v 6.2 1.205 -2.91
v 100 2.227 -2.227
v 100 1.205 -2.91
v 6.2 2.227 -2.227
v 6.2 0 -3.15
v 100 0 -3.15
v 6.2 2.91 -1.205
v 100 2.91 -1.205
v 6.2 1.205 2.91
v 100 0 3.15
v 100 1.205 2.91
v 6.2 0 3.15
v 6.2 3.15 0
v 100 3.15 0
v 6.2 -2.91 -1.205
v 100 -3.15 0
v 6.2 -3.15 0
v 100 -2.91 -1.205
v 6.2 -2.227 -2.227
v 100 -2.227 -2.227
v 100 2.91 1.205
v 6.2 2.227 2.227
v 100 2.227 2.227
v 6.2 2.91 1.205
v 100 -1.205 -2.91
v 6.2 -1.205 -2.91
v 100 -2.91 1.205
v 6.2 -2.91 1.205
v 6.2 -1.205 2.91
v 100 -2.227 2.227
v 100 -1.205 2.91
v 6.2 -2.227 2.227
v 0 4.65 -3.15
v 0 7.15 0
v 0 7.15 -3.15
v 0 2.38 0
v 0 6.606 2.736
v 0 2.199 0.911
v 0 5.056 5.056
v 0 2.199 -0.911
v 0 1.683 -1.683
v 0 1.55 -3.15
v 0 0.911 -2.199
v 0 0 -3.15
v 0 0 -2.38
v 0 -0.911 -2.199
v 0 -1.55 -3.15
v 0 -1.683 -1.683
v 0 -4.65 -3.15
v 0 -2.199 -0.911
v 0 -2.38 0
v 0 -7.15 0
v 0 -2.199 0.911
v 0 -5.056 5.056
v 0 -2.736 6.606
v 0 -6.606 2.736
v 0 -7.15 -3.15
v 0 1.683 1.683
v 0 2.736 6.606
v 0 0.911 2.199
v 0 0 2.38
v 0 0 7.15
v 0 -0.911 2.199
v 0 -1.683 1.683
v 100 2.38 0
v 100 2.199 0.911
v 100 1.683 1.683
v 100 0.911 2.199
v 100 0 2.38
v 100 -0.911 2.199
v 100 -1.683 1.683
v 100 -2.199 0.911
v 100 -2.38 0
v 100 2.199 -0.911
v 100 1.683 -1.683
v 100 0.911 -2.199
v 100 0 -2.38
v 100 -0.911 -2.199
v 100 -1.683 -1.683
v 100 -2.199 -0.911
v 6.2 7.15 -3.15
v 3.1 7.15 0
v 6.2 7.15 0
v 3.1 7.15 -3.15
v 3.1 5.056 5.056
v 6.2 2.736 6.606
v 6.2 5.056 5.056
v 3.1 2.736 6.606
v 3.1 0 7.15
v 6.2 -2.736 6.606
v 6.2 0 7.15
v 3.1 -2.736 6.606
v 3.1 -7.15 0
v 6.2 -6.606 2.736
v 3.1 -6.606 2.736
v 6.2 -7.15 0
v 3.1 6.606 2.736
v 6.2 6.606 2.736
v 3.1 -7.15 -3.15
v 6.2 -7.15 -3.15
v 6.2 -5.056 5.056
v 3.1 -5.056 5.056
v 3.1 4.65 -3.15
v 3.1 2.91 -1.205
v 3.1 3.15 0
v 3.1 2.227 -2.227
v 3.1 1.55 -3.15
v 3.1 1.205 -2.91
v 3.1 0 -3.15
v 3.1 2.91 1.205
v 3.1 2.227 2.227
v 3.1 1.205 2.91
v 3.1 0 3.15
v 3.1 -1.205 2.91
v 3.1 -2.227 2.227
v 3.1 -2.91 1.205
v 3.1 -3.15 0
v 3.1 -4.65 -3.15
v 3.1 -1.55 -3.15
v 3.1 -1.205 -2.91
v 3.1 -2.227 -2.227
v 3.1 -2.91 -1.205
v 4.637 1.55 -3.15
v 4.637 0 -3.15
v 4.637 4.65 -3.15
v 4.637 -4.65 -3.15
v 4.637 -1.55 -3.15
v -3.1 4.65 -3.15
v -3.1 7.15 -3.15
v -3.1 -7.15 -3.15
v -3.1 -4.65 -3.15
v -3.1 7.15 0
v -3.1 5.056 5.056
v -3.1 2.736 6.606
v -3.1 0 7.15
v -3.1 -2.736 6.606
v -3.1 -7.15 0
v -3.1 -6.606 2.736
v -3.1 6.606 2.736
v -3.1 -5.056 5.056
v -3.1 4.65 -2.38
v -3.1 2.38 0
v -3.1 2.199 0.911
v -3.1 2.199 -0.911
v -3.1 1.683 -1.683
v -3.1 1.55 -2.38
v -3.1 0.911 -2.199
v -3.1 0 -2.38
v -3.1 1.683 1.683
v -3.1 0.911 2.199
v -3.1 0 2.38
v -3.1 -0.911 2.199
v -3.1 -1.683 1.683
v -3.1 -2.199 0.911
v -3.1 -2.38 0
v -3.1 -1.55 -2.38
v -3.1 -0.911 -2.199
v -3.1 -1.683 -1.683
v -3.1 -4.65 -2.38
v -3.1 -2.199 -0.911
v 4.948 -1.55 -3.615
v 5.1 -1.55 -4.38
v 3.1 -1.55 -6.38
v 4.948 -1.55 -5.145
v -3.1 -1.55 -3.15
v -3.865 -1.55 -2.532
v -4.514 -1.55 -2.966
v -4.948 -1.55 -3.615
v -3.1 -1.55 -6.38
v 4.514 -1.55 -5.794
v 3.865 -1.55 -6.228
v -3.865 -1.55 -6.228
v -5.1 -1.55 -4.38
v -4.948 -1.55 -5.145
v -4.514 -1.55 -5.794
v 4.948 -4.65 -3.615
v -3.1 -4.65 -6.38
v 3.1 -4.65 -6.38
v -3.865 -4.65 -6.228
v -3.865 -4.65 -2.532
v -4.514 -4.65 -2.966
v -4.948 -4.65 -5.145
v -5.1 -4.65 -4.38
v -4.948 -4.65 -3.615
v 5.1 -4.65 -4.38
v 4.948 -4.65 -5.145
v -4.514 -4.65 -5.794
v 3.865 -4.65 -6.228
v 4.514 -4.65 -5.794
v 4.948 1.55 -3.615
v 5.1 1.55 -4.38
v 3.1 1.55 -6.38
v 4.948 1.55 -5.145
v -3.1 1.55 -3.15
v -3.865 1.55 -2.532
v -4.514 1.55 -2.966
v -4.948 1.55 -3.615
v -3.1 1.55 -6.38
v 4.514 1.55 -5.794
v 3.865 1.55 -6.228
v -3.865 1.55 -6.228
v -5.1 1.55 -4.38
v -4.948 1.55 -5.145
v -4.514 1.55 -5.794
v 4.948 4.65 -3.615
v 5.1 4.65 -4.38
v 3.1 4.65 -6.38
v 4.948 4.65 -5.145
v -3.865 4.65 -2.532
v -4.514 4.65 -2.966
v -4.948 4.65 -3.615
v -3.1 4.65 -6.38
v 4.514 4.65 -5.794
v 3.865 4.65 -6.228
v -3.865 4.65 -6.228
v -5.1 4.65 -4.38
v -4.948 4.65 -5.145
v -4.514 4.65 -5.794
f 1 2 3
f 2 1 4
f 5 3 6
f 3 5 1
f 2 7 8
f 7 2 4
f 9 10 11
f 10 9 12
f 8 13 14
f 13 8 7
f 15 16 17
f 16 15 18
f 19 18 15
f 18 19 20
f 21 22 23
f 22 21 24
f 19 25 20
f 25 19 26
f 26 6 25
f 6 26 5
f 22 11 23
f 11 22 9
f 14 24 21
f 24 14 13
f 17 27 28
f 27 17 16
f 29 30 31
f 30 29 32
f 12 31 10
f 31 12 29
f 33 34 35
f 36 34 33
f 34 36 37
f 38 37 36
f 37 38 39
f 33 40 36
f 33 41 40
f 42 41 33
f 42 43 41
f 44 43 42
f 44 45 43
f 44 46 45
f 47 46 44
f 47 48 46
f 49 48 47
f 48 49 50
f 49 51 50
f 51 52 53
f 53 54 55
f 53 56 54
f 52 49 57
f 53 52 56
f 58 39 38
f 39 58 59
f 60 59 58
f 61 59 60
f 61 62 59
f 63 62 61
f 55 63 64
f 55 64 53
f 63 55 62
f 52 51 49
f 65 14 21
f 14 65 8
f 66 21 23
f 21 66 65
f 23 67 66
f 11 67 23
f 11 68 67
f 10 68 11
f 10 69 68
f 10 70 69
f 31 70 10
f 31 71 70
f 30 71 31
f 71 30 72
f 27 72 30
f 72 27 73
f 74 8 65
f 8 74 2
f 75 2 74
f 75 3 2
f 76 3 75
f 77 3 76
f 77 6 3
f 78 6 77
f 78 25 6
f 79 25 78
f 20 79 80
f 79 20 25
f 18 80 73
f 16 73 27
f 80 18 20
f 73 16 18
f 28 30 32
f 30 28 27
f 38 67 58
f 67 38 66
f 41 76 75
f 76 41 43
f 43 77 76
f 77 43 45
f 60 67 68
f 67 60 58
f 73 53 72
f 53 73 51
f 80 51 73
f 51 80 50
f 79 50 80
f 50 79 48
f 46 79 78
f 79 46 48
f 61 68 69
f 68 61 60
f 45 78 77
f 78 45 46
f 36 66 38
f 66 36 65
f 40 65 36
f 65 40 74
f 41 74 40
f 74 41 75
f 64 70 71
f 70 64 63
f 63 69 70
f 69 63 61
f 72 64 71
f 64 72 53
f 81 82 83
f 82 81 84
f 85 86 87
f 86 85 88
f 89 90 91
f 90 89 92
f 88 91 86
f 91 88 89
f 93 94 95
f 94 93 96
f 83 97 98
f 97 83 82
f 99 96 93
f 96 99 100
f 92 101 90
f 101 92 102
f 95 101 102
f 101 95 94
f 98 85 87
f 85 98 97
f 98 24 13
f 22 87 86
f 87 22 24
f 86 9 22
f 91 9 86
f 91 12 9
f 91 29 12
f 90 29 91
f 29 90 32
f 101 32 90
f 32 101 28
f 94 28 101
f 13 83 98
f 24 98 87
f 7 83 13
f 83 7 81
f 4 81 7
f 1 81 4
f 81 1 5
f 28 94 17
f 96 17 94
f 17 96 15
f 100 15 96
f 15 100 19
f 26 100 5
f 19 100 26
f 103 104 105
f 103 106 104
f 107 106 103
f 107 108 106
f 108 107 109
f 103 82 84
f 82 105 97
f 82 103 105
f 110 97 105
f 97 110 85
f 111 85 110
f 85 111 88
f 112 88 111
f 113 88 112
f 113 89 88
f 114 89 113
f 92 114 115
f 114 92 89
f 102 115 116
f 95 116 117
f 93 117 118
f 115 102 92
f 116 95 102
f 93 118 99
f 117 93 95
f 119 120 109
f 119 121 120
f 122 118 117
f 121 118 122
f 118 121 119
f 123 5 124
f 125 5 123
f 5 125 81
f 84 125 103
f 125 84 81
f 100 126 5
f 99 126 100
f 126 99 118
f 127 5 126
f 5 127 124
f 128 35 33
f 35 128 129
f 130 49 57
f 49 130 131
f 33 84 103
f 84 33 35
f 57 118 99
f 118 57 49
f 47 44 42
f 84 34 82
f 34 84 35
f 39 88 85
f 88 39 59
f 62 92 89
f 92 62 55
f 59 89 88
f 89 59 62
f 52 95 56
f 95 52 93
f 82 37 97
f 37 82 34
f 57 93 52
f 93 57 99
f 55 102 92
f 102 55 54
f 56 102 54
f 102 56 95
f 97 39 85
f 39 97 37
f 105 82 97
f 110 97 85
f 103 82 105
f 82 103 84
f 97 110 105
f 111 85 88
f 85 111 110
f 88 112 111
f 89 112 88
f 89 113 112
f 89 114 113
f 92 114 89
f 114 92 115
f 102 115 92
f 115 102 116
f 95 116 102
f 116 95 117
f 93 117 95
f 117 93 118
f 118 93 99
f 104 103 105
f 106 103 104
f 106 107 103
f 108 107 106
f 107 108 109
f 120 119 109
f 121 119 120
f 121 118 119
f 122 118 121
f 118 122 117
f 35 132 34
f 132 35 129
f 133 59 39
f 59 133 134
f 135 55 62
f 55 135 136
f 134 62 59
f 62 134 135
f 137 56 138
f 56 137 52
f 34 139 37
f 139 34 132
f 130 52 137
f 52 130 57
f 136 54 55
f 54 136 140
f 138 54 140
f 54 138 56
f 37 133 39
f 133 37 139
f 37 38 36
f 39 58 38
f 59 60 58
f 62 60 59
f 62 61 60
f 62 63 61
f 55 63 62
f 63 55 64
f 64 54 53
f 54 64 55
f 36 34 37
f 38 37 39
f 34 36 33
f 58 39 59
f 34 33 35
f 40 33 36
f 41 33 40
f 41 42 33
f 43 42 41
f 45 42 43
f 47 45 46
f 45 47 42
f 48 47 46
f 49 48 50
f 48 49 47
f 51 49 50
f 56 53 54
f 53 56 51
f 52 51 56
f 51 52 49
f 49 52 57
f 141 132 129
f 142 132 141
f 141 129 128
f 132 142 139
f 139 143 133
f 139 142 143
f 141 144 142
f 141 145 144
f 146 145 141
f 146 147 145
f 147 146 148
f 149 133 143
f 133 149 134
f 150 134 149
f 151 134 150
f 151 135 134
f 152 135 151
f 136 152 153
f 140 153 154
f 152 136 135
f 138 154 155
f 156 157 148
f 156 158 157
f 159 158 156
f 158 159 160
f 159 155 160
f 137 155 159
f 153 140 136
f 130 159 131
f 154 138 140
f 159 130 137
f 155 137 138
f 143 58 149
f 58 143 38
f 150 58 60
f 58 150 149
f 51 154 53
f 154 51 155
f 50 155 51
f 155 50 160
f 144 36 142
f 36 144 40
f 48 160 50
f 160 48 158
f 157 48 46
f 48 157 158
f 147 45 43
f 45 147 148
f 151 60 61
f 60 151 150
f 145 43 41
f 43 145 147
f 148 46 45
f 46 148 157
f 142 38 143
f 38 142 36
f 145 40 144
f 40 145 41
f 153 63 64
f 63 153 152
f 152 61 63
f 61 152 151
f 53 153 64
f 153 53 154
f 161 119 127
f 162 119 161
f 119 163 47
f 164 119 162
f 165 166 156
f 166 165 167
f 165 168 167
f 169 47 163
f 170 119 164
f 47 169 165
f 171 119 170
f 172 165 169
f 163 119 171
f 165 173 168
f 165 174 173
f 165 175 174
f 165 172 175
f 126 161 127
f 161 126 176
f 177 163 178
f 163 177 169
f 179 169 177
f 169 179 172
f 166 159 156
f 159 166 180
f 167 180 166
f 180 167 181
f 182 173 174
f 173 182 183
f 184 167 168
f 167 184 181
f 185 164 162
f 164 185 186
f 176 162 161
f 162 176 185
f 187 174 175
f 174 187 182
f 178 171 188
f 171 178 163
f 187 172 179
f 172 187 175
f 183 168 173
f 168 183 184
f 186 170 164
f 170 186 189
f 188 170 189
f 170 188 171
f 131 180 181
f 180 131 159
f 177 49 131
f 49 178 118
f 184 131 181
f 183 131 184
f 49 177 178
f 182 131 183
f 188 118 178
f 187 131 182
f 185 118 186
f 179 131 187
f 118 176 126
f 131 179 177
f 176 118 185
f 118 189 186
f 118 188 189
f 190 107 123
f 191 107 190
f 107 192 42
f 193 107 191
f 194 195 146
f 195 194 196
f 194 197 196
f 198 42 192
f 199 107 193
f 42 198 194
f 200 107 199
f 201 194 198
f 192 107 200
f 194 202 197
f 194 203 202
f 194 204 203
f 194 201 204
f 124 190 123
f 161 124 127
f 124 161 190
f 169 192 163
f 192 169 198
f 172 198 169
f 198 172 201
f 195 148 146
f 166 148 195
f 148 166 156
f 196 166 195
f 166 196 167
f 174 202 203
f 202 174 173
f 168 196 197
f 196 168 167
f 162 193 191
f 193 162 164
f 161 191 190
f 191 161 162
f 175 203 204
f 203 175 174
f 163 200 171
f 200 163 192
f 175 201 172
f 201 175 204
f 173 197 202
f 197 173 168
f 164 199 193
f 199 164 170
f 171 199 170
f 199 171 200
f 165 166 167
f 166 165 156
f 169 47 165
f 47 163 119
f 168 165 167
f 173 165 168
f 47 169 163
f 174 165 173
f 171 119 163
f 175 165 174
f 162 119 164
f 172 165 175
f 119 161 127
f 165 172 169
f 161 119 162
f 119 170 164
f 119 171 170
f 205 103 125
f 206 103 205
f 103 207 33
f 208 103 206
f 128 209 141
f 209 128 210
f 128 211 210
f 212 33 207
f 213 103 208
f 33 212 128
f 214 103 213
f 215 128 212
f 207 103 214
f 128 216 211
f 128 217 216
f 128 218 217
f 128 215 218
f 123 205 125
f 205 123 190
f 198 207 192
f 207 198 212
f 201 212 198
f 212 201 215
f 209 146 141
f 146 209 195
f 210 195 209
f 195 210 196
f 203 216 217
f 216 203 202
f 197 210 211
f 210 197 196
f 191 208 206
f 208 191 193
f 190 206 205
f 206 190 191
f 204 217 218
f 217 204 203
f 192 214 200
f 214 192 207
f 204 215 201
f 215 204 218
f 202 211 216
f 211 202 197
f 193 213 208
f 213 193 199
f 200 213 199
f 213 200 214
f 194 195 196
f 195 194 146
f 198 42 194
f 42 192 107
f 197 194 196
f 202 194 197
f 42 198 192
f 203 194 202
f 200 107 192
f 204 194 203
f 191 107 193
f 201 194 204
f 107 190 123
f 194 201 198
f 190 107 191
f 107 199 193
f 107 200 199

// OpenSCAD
zff = 1/64;
drain_r = 10;
drain_pipe_snug_r = 0.2;
drain_pipe_or = 25.86/2 - drain_pipe_snug_r;
drain_pipe_ir = 21.6/2;
thickness = 3.1;

// This is the length of one bead and one bit of string.
// 0-0-0-0-0-0-0-...
// | | <-- This distance
bead_chain_straight_pitch = 60.6/10;
bead_r = 4.36/2; // The radius of a bead
bead_cord_r = 1.61/2; // The radius of the cord
bead_chain_extra_string = 0.5; // This extends the string segments a bit so they properly mesh with the next bead.

bead_clearance = 0.2; // The clearance around a bead to let it move smoothly. Includes the laser kerf.

max_wt = (drain_r*2 - bead_r*4)/2;
wt = 4;
shaft_r = 4;

if (wt > max_wt) {
    // This isn't valid openscad, but it does cause an error in console, so... success?
    error("wt is too big");
}

pump_length = 530;

module strip () {
    hull () {
        cylinder(r=wt/2, h=thickness, $fn=16);
        translate([pump_length,0,0]) cylinder(r=wt/2, h=thickness, $fn=16);
    }
}

module cap() {
    hull () {
        strip();
        translate([0,wt+bead_r*2+bead_clearance,0]) strip();
    }
}


module bead_chain_segment() {
    sphere(r=bead_r, $fn=16);
    rotate([90,0,0]) cylinder(r=bead_cord_r, h=bead_chain_straight_pitch-bead_r+bead_chain_extra_string, $fn=16);
}
module vertical_bead_chain_segment() {
    cylinder(r=bead_r, h=100,$fn=16);
    translate([-bead_cord_r,-(bead_chain_straight_pitch-bead_r+bead_chain_extra_string),0]) cube([bead_cord_r*2,bead_chain_straight_pitch-bead_r+bead_chain_extra_string,100]);
}

bead_n = 16;
bead_chain_r = bead_chain_straight_pitch/tan(360/bead_n);

module bead_chain_gear_solid() {
    difference() {
        cylinder(r=bead_chain_r, h=thickness);
        scale([1,1,100]) union() {
            for (i = [0:360/bead_n:360]) {
                rotate([0,0,i]) translate([bead_chain_r,0,0]) rotate([0,0,(-360/bead_n)/2]) bead_chain_segment();
                // rotate([0,0,i]) translate([bead_chain_r,0,0]) rotate([0,0,(-360/bead_n)/2]) vertical_bead_chain_segment();
            }
        }
        translate([0,0,-50]) cylinder(r=shaft_r, h=100, $fn=32);
    }
}
module bead_chain_gear_flange() {
    difference () {
        cylinder(r=bead_chain_r+bead_r/2, h=thickness);
        cylinder(r=shaft_r, h=thickness, $fn=32);
    }
}

drain_protrusion = 5;

module lasercut_stalk() {
    cap();
    translate([0,0,thickness]) strip();
    translate([0,0,thickness*2]) strip();
    translate([0,wt+bead_r*2+bead_clearance,thickness]) strip();
    translate([0,wt+bead_r*2+bead_clearance,thickness*2]) strip();
    translate([0,0,thickness*3]) cap();
}

pump_body_r = bead_chain_r+bead_r;
// This ensures the stackup is an integer thickness of acrylic.
pump_face_plate_z_ideal = (drain_pipe_or+wt)*2;
pump_face_plate_z = ceil(pump_face_plate_z_ideal/thickness)*thickness;

// This is the part through which the drain pipe protrudes
module pump_face_plate() {
    difference() {
        translate([0,-(bead_chain_r+bead_r+wt),0]) cube([thickness, (bead_chain_r+bead_r+wt)*2, pump_face_plate_z]);
        translate([-drain_protrusion,0,pump_face_plate_z/2]) rotate([0,90,0]) cylinder(r=drain_pipe_or, h=100, $fn=32);
    }
}

// This has a slightly smaller hole in it to block the drain pipe from coming in any further.
module pump_face_plate_blocker(pipe_hole_r, offset) {
    difference() {
        translate([0,-(bead_chain_r+bead_r+wt),0]) cube([thickness, (bead_chain_r+bead_r+wt)*2, pump_face_plate_z]);
        translate([-zff,0,pump_face_plate_z/2]) rotate([0,90,0]) {
        difference() {
            cylinder(r=drain_pipe_ir, h=100, $fn=32);
            // #translate([-50,-drain_pipe_ir,0]) cube([100,drain_pipe_ir-bead_chain_tube_or,100]);
            translate([0,offset,0]) cylinder(r=pipe_hole_r+wt, h=100, $fn=32);
            // Awkwardly fillet the sharp corner around the bead chain pipe holder
            translate([pipe_hole_r+wt,offset+pipe_hole_r/2,0]) difference() {
                rotate([0,0,-30]) translate([-wt,-wt/2,0]) cube([wt*2,wt,thickness]);
            }
            translate([-(pipe_hole_r+wt),offset+pipe_hole_r/2,0]) difference() {
                rotate([0,0,30]) translate([-wt,-wt/2,0]) cube([wt*2,wt,thickness]);
            }
        }
        translate([0,offset,0]) cylinder(r=pipe_hole_r,h=100, $fn=16);
        }
    }
}

// This is the top and bottom parts of the pump body.
module pump_body_base() {
    translate([-thickness/2,0,0]) difference () {
        hull() {
            translate([0,0,thickness/2]) cube([thickness, (bead_chain_r+bead_r+wt)*2, thickness],center=true);
            translate([-(bead_chain_r+bead_r+wt)-drain_protrusion,0,0]) cylinder(r=bead_chain_r+bead_r+wt,h=thickness);
        }
        translate([-(bead_chain_r+bead_r+wt)-drain_protrusion,0,0]) cylinder(r=shaft_r,h=thickness);
    }
}

// These parts are stacked up to form the walls of the body.
module pump_body_wall() {
    difference() {
        pump_body_base();
        hull() {
            translate([-(bead_chain_r+bead_r+wt)-drain_protrusion-thickness/2,0,0]) cylinder(r=bead_chain_r+bead_r,h=thickness);
            translate([0,0,thickness/2]) cube([thickness, (bead_chain_r+bead_r)*2, thickness],center=true);
        }
    }
}

bead_chain_tube_or = 6.3/2;
bead_chain_tube_ir = bead_chain_tube_or-0.77;
module bead_chain_tube() {
    rotate([0,90,0]) difference() {
        cylinder(r=bead_chain_tube_or, h=600+zff*2, $fn=16);
        translate([0,0,-zff]) cylinder(r=bead_chain_tube_ir, h=600, $fn=16);
    }
}

module pump_body_wall_cutout() {
    glue_lip = wt;
    difference() {
        pump_body_wall();
        translate([-((bead_chain_r+bead_r+wt)+drain_protrusion+thickness/2)+glue_lip,0,0])
            cube([(bead_chain_r+bead_r+wt+drain_protrusion+thickness/2)-glue_lip,100,thickness]);
    }
}

module pump_face_plate_blocker_inner() {
    pump_face_plate_blocker(bead_chain_tube_ir,-(drain_pipe_ir-bead_chain_tube_or));
}
module pump_face_plate_blocker_outer() {
    pump_face_plate_blocker(bead_chain_tube_or,-(drain_pipe_ir-bead_chain_tube_or));
}

// This holds the cord guide onto the end of the tube.
module cord_guide_sleeve(hole_r) {
    difference() {
        hull() {
            rotate([0,90,0]) cylinder(r=bead_chain_tube_or+wt, h=thickness, $fn=16);
            translate([thickness/2,0,-bead_chain_tube_or-wt]) cube([thickness, (bead_chain_tube_or+wt)*2, 1],center=true);
        }
        translate([thickness/2,0,-bead_chain_tube_or-wt]) cube([thickness, (bead_chain_tube_or+wt)*2, wt*2],center=true);
        translate([-zff,0,0]) rotate([0,90,0]) cylinder(r=hole_r, h=100, $fn=16);
    }
}

module cord_guide_lip() {
    lip_r = 2;

    translate([-thickness,0,0]) difference () {
        translate([0,thickness/2,-bead_chain_tube_ir-lip_r]) hull () {
            rotate([90,0,0]) cylinder(r=lip_r, h=thickness,$fn=16);
            translate([thickness*2,0,0]) rotate([90,0,0]) cylinder(r=lip_r, h=thickness,$fn=16);
        }
        translate([50,0,-bead_chain_tube_ir-(bead_chain_tube_or-bead_chain_tube_ir)/2]) cube([100, thickness, bead_chain_tube_or-bead_chain_tube_ir],center=true);
    }
}
// !cord_guide_lip();

module cord_guide_assembled () {
    rotate([0,90,0]) difference() {
        cylinder(r=bead_chain_tube_or, h=100, $fn=16);
        translate([0,0,-zff]) cylinder(r=bead_chain_tube_ir, h=100+zff*2, $fn=16);
    }
    render() {
        translate([thickness,0,0]) cord_guide_sleeve(bead_chain_tube_or);
        translate([0,0,0]) cord_guide_sleeve(bead_chain_tube_or);
        translate([-thickness,0,0]) cord_guide_sleeve(bead_chain_tube_ir);
    }
    translate([0,-thickness,0]) cord_guide_lip();
    translate([0,0,0]) cord_guide_lip();
    translate([0,thickness,0]) cord_guide_lip();
}


// TODO try to make this an odd number of slices thick so the gear can be centered on the pipe.
module assembled() {
    // translate([0,0, thickness*2]) rotate([0,90,0]) #cylinder(r=drain_r, h=pump_length, $fn=16);
    // translate([wt/2+pump_body_r,wt/2-(wt+bead_r*2+bead_clearance)/2+-bead_r,0]) lasercut_stalk();
    translate([-(bead_chain_r+bead_r+wt)-drain_protrusion-thickness/2,0,thickness*3.5]) render() bead_chain_gear_flange();
    translate([-(bead_chain_r+bead_r+wt)-drain_protrusion-thickness/2,0,thickness*4.5]) render() bead_chain_gear_solid();
    translate([-(bead_chain_r+bead_r+wt)-drain_protrusion-thickness/2,0,thickness*5.5]) render() bead_chain_gear_solid();
    translate([-(bead_chain_r+bead_r+wt)-drain_protrusion-thickness/2,0,thickness*6.5]) render() bead_chain_gear_flange();
    // translate([0,0,thickness*2]) render() bead_chain_gear_solid();
    pump_body_base();
    // translate([0,0,pump_face_plate_z-thickness]) pump_body_base();
    translate([thickness*4,0,0]) pump_face_plate();
    translate([thickness*3,0,0]) pump_face_plate();
    translate([thickness*2,0,0]) pump_face_plate();
    pump_face_plate_blocker_inner();
    translate([thickness,0,0]) pump_face_plate_blocker_outer();
    render() {
        translate([0,0,thickness]) pump_body_wall();
        for (i = [2:8]) {
            translate([0,0,thickness*i]) pump_body_wall_cutout();
        }
        translate([0,0,thickness*9]) pump_body_wall();
    }
    // translate([0,-(drain_pipe_ir-bead_chain_tube_or),pump_face_plate_z/2]) bead_chain_tube();
    // vertical_bead_chain_segment();
    // bead_chain_gear(1,0);
}

// projection() rotate([0,90,0]) pump_face_plate_blocker(bead_chain_tube_ir,-(drain_pipe_ir-bead_chain_tube_or));
// projection() rotate([0,90,0]) pump_face_plate_blocker(bead_chain_tube_or,-(drain_pipe_ir-bead_chain_tube_or));

batch_export=false;

part_revision_number = 4;
// These are load-bearing comments. The make script awks this file for
// lines between these markers to determine what it needs to render to a file.
// PARTSMARKERSTART
export_bead_chain_gear_flange = false;
export_bead_chain_gear_solid = false;
export_pump_body_base = false;
export_pump_face_plate = false;
export_pump_face_plate_blocker_inner = false;
export_pump_face_plate_blocker_outer = false;
export_pump_body_wall = false;
export_pump_body_wall_cutout = false;
export_cord_guide_sleeve = false;
export_cord_guide_sleeve_blocker = false;
export_cord_guide_lip = false;
// PARTSMARKEREND

if (batch_export) {
    if (export_bead_chain_gear_flange) projection() bead_chain_gear_flange();
    if (export_bead_chain_gear_solid) projection() bead_chain_gear_solid();
    if (export_pump_body_base) projection() pump_body_base();
    if (export_pump_face_plate) projection() rotate([0,90,0]) pump_face_plate();
    if (export_pump_face_plate_blocker_inner) projection() rotate([0,90,0]) pump_face_plate_blocker_inner();
    if (export_pump_face_plate_blocker_outer) projection() rotate([0,90,0]) pump_face_plate_blocker_outer();
    if (export_pump_body_wall) projection() pump_body_wall();
    if (export_pump_body_wall_cutout) projection() pump_body_wall_cutout();
    if (export_cord_guide_sleeve) projection() rotate([0,90,0]) cord_guide_sleeve(bead_chain_tube_or);
    if (export_cord_guide_sleeve_blocker) projection() rotate([0,90,0]) cord_guide_sleeve(bead_chain_tube_ir);
    if (export_cord_guide_lip) projection() rotate([90,0,0]) cord_guide_lip();

} else {
    // assembled();
    cord_guide_assembled();
}
